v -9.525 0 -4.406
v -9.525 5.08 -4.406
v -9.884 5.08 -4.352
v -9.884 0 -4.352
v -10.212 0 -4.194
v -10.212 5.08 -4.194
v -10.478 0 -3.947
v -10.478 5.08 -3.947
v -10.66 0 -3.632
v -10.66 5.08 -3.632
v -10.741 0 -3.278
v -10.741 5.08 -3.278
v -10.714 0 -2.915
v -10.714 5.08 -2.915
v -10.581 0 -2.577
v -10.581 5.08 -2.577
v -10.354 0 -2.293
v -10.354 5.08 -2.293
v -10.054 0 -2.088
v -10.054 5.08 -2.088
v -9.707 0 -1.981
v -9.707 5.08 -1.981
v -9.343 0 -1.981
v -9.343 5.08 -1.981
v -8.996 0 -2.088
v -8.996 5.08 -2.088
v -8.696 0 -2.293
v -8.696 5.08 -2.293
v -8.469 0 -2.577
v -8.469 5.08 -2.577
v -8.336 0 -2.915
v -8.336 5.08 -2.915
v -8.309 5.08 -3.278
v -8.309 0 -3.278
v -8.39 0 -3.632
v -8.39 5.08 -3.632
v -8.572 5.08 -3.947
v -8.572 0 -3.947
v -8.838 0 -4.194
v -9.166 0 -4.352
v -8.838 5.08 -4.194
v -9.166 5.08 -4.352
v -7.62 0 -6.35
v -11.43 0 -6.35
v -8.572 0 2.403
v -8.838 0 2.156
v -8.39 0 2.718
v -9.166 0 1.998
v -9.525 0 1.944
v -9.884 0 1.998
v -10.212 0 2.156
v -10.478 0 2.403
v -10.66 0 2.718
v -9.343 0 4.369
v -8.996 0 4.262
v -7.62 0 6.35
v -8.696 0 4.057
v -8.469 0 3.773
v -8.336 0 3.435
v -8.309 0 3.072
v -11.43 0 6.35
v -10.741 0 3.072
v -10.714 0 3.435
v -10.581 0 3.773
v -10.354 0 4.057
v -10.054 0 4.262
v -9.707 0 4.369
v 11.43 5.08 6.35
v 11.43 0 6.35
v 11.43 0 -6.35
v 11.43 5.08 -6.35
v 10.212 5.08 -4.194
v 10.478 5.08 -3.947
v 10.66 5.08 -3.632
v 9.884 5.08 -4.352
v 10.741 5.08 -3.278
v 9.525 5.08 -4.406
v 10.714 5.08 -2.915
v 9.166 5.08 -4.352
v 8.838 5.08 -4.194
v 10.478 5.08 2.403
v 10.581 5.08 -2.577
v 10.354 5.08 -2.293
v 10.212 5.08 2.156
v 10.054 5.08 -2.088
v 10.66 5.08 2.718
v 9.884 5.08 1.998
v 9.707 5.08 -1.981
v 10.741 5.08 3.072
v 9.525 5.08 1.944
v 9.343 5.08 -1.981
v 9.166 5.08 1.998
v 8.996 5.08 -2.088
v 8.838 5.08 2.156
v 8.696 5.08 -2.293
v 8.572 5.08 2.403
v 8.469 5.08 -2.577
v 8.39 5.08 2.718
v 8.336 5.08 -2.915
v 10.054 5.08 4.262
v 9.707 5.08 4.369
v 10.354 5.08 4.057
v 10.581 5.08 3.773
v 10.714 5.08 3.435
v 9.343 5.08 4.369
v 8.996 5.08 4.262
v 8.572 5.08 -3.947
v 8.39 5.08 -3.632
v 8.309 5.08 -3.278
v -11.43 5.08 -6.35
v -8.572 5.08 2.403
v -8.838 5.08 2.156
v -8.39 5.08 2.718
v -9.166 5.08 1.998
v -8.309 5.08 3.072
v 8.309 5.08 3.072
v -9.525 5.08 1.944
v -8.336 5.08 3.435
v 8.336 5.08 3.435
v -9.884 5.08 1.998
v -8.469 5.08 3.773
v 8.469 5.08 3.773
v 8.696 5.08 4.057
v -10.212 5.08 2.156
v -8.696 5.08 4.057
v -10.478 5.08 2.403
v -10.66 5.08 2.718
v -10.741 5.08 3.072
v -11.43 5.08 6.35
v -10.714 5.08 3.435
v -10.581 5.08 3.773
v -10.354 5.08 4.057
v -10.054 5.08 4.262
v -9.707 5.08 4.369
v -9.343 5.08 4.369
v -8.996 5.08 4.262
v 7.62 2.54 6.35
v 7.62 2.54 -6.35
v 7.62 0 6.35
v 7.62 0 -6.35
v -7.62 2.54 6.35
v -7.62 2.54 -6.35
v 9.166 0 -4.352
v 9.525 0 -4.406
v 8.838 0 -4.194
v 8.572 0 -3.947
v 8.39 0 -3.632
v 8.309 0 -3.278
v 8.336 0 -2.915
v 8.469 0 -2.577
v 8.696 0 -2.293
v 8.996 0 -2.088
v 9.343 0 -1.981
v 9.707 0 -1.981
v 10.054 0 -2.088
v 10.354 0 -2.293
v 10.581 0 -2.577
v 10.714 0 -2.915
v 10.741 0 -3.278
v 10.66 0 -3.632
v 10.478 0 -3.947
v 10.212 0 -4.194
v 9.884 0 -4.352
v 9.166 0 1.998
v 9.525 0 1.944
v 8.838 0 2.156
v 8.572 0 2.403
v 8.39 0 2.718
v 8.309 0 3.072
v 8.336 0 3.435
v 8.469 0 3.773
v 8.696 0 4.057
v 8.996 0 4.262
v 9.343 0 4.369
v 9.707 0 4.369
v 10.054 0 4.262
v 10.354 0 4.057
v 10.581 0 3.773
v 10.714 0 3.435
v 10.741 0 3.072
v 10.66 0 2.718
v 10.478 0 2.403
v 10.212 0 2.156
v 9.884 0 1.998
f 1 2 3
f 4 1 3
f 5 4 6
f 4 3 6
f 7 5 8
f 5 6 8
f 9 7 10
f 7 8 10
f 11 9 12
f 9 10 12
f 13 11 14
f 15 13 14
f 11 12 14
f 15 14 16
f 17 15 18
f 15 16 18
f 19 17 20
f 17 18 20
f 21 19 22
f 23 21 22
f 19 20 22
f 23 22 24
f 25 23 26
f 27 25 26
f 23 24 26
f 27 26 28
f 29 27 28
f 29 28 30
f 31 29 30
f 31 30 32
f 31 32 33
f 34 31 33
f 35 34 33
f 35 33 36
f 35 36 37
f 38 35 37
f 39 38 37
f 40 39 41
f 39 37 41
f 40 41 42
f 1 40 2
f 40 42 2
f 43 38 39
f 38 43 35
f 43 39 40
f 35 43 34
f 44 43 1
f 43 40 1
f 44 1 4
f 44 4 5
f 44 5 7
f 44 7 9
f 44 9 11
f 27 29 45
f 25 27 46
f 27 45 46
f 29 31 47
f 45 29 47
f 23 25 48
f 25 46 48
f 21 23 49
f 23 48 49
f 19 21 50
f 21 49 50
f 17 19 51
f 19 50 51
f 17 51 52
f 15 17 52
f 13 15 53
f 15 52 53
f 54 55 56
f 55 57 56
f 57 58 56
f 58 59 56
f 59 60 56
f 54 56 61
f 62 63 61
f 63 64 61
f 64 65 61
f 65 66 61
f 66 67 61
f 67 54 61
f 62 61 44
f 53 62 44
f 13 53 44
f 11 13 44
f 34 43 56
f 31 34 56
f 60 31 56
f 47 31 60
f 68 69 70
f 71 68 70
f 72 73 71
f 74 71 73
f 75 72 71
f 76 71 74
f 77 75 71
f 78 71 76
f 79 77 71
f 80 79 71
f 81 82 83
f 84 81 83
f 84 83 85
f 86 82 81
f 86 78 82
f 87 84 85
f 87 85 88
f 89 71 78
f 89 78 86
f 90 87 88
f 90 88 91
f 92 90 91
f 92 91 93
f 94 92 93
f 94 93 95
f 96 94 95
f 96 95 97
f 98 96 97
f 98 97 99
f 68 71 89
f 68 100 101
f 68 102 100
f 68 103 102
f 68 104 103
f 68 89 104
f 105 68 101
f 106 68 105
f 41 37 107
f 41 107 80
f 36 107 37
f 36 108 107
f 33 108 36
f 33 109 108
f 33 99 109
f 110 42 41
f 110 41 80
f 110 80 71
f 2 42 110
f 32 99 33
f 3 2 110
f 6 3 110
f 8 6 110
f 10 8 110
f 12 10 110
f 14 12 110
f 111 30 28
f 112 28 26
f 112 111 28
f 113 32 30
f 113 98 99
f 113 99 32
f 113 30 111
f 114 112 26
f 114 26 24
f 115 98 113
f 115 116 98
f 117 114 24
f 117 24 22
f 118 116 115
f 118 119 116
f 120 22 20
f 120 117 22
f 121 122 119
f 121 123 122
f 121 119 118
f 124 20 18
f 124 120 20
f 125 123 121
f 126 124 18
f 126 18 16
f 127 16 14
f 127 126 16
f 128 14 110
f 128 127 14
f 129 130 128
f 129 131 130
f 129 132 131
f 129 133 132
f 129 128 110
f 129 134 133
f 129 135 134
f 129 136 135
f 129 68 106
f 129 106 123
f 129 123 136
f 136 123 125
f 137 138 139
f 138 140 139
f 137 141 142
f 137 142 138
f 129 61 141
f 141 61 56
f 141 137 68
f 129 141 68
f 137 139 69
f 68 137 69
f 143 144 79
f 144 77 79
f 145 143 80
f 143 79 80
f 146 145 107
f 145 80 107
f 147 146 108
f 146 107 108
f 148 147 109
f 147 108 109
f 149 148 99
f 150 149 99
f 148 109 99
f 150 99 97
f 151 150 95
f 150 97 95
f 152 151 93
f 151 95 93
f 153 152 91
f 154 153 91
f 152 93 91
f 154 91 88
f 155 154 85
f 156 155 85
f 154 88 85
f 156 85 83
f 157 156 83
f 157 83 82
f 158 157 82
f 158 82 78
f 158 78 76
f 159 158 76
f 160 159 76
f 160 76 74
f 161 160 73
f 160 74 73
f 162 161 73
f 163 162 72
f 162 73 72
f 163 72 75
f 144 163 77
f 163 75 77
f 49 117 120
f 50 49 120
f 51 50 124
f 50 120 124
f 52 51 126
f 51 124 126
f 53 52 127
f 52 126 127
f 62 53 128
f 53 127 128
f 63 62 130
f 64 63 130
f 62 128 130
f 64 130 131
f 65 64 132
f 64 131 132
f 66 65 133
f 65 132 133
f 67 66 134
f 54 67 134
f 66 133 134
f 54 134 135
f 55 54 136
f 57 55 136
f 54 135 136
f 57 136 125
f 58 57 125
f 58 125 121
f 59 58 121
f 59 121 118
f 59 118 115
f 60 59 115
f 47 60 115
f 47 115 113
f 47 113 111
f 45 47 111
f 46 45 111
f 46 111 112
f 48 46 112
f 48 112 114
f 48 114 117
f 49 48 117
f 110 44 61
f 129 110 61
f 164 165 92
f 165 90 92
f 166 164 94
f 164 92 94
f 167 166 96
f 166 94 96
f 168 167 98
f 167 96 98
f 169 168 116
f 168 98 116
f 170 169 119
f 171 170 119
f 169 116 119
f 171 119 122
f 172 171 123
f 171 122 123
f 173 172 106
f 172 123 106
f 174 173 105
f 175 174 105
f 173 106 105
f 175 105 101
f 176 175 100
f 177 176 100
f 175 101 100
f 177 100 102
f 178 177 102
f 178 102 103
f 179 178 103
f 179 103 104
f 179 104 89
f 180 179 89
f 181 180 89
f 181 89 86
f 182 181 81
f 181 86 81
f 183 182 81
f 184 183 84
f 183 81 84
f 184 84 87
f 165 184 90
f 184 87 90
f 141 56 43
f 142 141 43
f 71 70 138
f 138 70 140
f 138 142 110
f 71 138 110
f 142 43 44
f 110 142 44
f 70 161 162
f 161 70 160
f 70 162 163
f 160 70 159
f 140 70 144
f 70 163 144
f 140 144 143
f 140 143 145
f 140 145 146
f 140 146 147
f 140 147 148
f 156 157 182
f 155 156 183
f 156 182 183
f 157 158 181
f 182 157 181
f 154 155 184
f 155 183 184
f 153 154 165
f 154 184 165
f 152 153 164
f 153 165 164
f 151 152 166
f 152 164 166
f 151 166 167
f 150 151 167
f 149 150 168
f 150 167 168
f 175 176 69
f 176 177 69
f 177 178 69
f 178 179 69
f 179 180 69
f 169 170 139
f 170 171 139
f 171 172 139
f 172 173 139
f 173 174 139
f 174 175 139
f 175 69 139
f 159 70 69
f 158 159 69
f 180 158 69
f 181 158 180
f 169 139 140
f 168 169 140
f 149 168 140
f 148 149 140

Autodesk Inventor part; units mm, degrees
ref_plane "YZ Plane" through (0, 0, 0) normal (1, 0, 0) x (0, 1, 0)
ref_plane "XZ Plane" through (0, 0, 0) normal (0, 1, 0) x (-1, 0, 0)
ref_plane "XY Plane" through (0, 0, 0) normal (0, 0, 1) x (1, 0, 0)
sketch "Sketch1" plane through (0, 0, 0) normal (0, 1, 0) x (-1, 0, 0)
  line L0 (-11.43, -6.35) -> (11.43, -6.35)
  line L1 (11.43, -6.35) -> (11.43, 6.35)
  line L2 (11.43, 6.35) -> (-11.43, 6.35)
  line L3 (-11.43, 6.35) -> (-11.43, -6.35)
  line L4 (-11.43, -6.35) -> (11.43, 6.35) construction
  line L5 (11.43, -6.35) -> (-11.43, 6.35) construction
  point P0 (0, 0)
  point P1 (0, 0)
  dimension "d19" = 22.86
  dimension "d20" = 12.7
sketch "Sketch2" plane through (0, 0, 0) normal (0, 1, 0) x (-1, 0, 0)
  line L0 (9.525, 3.1634) -> (9.525, -3.1866) construction
  line L1 (9.525, -3.1866) -> (-9.525, -3.1866) construction
  line L2 (-9.525, -3.1866) -> (-9.525, 3.1634) construction
  line L3 (-9.525, 3.1634) -> (9.525, 3.1634) construction
  line L4 (9.525, 6.3268) -> (9.525, 3.1634) construction
  line L5 (-9.525, 3.1634) -> (-9.525, 6.5546) construction
  line L6 (11.43, -6.35) -> (11.43, 6.35) projected
  line L7 (-11.43, -6.35) -> (11.43, -6.35) projected
  line L8 (-11.43, 6.35) -> (-11.43, -6.35) projected
  line L9 (11.43, 6.35) -> (-11.43, 6.35) projected
  line L10 (9.525, -3.1866) -> (9.525, -6.35) construction
  point P0 (0, 0)
  dimension "d18" = 6.35
  dimension "d22" = 19.05
  dimension "d23" = 1.905
  dimension "d24" = 3.1634
extrude "Extrusion1" add sketch "Sketch1" along normal blind 5.08
hole "Hole1" at (-9.525, 0, 3.1634) at (-9.525, 0, -3.1866) at (9.525, 0, -3.1866) at (9.525, 0, 3.1634) direction (0, 1, 0) diameter 2.4384 depth 5.08 clearance for "Flat Head Machine Screw (82)" size "#2" standard "Ansi Unified Screw Threads"
sketch "Sketch3" plane through (0, 0, 0) normal (0, -1, 0) x (1, 0, 0)
  line L0 (11.43, -6.35) -> (-11.43, -6.35) projected
  line L1 (7.62, 6.35) -> (-7.62, 6.35)
  line L2 (-7.62, 6.35) -> (-7.62, -6.35)
  line L3 (-7.62, -6.35) -> (7.62, -6.35)
  line L4 (7.62, -6.35) -> (7.62, 6.35)
  line L5 (7.62, 6.35) -> (-7.62, -6.35) construction
  line L6 (-7.62, 6.35) -> (7.62, -6.35) construction
  point P0 (0, 0)
  point P1 (7.62, -6.35)
  dimension "d34" = 15.24
extrude "Extrusion2" cut sketch "Sketch3" against normal blind 2.54
properties part number "Controller_Strap"
